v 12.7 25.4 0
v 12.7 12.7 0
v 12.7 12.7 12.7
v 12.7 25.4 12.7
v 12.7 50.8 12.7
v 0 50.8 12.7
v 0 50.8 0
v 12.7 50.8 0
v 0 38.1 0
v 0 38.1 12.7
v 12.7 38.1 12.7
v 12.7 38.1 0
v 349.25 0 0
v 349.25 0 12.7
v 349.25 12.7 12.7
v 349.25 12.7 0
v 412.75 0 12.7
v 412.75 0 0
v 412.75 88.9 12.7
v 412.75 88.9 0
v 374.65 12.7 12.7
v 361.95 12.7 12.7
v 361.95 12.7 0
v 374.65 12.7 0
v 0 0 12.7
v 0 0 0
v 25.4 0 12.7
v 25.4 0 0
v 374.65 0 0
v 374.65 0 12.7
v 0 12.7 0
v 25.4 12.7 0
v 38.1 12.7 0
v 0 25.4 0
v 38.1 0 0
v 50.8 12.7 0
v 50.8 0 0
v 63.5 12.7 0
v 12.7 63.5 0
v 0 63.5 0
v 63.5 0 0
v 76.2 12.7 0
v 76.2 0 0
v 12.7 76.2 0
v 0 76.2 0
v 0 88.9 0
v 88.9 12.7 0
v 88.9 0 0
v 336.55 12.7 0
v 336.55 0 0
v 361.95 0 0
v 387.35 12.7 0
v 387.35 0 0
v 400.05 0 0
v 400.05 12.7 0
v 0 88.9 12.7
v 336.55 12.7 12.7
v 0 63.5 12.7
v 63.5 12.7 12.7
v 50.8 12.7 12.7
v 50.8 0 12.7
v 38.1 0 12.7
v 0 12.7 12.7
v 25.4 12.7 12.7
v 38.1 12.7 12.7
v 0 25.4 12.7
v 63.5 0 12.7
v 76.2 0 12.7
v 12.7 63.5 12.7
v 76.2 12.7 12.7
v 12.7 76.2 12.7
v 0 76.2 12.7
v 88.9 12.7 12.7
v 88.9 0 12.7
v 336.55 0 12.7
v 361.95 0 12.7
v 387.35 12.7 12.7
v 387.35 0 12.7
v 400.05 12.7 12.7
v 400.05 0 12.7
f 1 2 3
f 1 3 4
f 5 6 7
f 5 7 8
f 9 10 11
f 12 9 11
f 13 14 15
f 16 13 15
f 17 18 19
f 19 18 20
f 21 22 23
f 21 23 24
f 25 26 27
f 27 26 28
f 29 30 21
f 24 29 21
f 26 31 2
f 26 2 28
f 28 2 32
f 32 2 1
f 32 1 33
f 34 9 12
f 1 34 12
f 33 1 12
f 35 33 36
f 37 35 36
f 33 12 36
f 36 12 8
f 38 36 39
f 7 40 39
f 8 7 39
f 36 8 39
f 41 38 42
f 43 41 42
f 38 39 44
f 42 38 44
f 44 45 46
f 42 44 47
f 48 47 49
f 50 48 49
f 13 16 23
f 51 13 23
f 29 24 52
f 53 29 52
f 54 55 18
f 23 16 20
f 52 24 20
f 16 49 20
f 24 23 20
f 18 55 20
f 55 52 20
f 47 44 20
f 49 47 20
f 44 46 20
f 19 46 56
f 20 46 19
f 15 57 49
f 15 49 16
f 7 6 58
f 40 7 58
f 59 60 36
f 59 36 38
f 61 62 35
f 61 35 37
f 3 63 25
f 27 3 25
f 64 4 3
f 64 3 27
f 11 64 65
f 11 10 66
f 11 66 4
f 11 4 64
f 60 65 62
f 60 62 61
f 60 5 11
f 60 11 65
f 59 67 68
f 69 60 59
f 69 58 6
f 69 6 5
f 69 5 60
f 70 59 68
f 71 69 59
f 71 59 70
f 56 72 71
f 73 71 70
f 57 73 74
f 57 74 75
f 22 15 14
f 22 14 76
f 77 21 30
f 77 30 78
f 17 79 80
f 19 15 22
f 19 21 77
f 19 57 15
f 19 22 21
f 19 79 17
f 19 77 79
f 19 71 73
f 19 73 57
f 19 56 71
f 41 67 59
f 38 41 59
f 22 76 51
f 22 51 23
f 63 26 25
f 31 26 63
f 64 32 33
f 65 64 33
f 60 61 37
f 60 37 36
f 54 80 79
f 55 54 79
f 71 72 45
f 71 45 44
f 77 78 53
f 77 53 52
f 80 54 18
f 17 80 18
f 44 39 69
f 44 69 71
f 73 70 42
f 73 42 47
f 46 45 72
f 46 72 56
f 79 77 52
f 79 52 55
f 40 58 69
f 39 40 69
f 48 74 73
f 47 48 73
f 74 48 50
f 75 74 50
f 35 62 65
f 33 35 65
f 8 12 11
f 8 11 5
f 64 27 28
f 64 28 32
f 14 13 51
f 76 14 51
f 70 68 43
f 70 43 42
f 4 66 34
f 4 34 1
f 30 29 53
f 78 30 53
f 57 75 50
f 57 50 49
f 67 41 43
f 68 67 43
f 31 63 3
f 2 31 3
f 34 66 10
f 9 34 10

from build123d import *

# Parameters (mm, degrees)
F0_W     = 412.75
F0_H     = 88.9
F1_DEPTH = 12.7
F2_W     = 12.7
F2_H     = 12.7
F3_DEPTH = 25.4
F4_W     = 12.7
F4_H     = 12.7
F5_DEPTH = 25.4
F6_W     = 12.7
F6_H     = 12.7
F7_DEPTH = 25.4


with BuildPart() as f1:
    # F0 (on Top) → F1 (new body)
    with BuildSketch(Plane.XY):
        with Locations((206.375, 44.45)):
            Rectangle(F0_W, F0_H)
    extrude(amount=F1_DEPTH)

    # F2 (on face) → F3 (cut)
    with BuildSketch(Plane.XY.offset(12.7)):
        with Locations((6.35, 19.05)):
            Rectangle(F2_W, F2_H)
        with Locations((6.35, 69.85)):
            Rectangle(F2_W, F2_H)
        with Locations((6.35, 44.45)):
            Rectangle(F2_W, F2_H)
    extrude(amount=-F3_DEPTH, mode=Mode.SUBTRACT)

    # F4 (on face) → F5 (cut)
    with BuildSketch(Plane.XY.offset(12.7)):
        with Locations((393.7, 6.35)):
            Rectangle(F4_W, F4_H)
        with Locations((368.3, 6.35)):
            Rectangle(F4_W, F4_H)
        with Locations((342.9, 6.35)):
            Rectangle(F4_W, F4_H)
    extrude(amount=-F5_DEPTH, mode=Mode.SUBTRACT)

    # F6 (on face) → F7 (cut)
    with BuildSketch(Plane.XY.offset(12.7)):
        with Locations((31.75, 6.35)):
            Rectangle(F6_W, F6_H)
        with Locations((57.15, 6.35)):
            Rectangle(F6_W, F6_H)
        with Locations((82.55, 6.35)):
            Rectangle(F6_W, F6_H)
    extrude(amount=-F7_DEPTH, mode=Mode.SUBTRACT)


solid = f1.part
